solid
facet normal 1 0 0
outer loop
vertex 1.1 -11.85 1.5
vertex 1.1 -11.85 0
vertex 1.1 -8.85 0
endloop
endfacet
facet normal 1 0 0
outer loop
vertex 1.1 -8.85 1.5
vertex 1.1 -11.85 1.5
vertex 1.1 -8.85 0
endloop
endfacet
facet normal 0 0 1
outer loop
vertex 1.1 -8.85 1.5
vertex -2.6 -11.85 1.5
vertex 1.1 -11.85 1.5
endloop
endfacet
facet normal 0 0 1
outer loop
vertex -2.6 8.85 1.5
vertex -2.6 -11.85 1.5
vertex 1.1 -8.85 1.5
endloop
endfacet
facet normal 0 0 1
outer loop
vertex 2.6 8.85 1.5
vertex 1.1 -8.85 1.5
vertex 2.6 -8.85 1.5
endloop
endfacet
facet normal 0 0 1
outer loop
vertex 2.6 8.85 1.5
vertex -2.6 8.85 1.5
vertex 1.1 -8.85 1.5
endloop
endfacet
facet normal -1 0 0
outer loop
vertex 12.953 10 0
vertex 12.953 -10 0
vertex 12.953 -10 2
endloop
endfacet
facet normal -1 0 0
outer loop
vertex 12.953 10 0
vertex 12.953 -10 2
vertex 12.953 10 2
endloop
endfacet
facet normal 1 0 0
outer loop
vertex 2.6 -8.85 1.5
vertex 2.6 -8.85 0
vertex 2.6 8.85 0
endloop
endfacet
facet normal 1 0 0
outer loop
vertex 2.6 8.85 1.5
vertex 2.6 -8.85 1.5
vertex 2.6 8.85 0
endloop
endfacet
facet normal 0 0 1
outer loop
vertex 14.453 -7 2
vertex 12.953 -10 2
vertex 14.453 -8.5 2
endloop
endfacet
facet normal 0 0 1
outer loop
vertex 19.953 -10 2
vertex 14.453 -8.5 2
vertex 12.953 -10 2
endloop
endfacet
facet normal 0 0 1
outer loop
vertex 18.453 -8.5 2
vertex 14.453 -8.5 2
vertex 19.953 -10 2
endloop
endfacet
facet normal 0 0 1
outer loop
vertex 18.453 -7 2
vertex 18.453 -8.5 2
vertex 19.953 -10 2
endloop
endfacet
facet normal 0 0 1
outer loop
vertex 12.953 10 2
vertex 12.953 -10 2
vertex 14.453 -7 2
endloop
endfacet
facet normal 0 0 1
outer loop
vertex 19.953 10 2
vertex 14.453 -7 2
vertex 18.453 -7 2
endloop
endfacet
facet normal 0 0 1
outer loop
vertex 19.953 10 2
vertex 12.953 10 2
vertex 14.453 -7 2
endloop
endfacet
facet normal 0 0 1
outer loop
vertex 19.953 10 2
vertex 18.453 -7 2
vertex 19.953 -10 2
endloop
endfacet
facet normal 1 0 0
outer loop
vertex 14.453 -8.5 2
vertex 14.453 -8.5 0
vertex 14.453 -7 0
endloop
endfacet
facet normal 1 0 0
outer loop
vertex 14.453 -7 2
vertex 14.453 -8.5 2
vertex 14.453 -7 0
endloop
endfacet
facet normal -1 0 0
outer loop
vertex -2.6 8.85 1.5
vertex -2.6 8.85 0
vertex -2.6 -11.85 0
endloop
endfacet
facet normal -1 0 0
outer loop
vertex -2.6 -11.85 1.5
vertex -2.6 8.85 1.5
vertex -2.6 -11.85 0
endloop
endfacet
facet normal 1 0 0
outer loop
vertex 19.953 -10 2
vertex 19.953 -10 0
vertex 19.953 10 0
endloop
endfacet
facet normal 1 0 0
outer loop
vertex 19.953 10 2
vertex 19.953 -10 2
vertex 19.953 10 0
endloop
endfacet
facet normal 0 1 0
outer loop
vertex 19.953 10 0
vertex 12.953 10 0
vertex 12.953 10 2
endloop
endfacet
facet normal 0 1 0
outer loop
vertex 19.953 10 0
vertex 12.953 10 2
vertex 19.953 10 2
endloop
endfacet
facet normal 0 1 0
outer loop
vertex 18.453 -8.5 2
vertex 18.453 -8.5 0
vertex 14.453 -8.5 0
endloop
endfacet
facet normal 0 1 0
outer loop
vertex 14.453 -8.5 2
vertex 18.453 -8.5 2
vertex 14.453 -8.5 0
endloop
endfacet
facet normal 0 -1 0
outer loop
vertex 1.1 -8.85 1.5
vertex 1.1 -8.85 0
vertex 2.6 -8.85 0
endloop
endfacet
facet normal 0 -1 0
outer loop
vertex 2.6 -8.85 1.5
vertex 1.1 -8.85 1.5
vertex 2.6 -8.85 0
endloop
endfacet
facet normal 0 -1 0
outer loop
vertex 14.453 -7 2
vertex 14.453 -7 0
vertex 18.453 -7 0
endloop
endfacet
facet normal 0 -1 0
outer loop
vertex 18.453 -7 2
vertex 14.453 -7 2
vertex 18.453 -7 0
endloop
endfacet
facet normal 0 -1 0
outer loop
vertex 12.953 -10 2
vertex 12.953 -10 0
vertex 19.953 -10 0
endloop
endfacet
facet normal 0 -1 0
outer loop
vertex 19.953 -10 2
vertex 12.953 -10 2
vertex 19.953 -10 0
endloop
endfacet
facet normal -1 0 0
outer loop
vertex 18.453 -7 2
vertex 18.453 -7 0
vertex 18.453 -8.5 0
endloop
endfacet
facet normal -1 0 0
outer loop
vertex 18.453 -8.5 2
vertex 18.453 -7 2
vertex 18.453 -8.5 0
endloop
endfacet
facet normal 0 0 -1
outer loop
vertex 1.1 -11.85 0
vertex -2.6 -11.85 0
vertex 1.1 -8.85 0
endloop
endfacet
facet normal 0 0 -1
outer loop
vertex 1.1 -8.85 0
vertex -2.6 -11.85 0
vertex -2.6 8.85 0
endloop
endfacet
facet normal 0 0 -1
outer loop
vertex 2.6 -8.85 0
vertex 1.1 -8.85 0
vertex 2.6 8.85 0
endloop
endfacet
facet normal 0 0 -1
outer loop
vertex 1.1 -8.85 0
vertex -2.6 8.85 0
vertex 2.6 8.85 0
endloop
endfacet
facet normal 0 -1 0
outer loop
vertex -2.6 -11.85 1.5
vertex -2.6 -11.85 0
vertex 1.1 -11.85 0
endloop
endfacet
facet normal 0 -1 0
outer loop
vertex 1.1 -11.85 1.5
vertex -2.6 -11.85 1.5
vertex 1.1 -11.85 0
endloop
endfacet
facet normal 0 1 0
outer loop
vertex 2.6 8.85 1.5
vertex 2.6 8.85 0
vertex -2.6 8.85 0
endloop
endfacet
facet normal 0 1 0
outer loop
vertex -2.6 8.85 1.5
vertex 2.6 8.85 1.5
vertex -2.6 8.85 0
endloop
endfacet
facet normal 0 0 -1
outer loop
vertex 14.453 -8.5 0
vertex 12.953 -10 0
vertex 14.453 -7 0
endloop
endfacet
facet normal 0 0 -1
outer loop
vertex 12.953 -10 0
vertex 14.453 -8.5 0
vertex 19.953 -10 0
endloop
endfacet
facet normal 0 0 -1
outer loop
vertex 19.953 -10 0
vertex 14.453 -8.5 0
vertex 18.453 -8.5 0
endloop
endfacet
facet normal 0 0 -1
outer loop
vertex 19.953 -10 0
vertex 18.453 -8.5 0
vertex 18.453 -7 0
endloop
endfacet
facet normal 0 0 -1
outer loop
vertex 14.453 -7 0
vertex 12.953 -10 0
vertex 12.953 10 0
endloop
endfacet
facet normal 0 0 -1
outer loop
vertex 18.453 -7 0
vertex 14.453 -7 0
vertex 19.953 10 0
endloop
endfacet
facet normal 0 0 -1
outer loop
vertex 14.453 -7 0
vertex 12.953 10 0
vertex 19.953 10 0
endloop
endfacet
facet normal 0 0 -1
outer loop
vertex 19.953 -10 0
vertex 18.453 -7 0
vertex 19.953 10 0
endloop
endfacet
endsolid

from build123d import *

# Parameters (mm, degrees)
F0_W     = 3.7
F0_H     = 3
F1_DEPTH = 1.5
F2_W     = 7
F2_H     = 20
F3_DEPTH = 2


with BuildPart() as f1:
    # F0 (on Top) → F1 (new body)
    with BuildSketch(Plane.XY):
        Polygon((2.6, -8.85), (2.6, 8.85), (-2.6, 8.85), (-2.6, -8.85), (1.1, -8.85), align=None)
        with Locations((-0.75, -10.35)):
            Rectangle(F0_W, F0_H)
    extrude(amount=F1_DEPTH)


with BuildPart() as f3:
    # F2 (on Top) → F3 (new body)
    with BuildSketch(Plane.XY):
        with Locations((16.453162, 0)):
            Rectangle(F2_W, F2_H)
        Polygon((18.453162, -8.5), (16.453162, -8.5), (14.453162, -8.5), (14.453162, -7), (18.453162, -7), align=None, mode=Mode.SUBTRACT)
    extrude(amount=F3_DEPTH)


solid = Compound([f1.part, f3.part])
